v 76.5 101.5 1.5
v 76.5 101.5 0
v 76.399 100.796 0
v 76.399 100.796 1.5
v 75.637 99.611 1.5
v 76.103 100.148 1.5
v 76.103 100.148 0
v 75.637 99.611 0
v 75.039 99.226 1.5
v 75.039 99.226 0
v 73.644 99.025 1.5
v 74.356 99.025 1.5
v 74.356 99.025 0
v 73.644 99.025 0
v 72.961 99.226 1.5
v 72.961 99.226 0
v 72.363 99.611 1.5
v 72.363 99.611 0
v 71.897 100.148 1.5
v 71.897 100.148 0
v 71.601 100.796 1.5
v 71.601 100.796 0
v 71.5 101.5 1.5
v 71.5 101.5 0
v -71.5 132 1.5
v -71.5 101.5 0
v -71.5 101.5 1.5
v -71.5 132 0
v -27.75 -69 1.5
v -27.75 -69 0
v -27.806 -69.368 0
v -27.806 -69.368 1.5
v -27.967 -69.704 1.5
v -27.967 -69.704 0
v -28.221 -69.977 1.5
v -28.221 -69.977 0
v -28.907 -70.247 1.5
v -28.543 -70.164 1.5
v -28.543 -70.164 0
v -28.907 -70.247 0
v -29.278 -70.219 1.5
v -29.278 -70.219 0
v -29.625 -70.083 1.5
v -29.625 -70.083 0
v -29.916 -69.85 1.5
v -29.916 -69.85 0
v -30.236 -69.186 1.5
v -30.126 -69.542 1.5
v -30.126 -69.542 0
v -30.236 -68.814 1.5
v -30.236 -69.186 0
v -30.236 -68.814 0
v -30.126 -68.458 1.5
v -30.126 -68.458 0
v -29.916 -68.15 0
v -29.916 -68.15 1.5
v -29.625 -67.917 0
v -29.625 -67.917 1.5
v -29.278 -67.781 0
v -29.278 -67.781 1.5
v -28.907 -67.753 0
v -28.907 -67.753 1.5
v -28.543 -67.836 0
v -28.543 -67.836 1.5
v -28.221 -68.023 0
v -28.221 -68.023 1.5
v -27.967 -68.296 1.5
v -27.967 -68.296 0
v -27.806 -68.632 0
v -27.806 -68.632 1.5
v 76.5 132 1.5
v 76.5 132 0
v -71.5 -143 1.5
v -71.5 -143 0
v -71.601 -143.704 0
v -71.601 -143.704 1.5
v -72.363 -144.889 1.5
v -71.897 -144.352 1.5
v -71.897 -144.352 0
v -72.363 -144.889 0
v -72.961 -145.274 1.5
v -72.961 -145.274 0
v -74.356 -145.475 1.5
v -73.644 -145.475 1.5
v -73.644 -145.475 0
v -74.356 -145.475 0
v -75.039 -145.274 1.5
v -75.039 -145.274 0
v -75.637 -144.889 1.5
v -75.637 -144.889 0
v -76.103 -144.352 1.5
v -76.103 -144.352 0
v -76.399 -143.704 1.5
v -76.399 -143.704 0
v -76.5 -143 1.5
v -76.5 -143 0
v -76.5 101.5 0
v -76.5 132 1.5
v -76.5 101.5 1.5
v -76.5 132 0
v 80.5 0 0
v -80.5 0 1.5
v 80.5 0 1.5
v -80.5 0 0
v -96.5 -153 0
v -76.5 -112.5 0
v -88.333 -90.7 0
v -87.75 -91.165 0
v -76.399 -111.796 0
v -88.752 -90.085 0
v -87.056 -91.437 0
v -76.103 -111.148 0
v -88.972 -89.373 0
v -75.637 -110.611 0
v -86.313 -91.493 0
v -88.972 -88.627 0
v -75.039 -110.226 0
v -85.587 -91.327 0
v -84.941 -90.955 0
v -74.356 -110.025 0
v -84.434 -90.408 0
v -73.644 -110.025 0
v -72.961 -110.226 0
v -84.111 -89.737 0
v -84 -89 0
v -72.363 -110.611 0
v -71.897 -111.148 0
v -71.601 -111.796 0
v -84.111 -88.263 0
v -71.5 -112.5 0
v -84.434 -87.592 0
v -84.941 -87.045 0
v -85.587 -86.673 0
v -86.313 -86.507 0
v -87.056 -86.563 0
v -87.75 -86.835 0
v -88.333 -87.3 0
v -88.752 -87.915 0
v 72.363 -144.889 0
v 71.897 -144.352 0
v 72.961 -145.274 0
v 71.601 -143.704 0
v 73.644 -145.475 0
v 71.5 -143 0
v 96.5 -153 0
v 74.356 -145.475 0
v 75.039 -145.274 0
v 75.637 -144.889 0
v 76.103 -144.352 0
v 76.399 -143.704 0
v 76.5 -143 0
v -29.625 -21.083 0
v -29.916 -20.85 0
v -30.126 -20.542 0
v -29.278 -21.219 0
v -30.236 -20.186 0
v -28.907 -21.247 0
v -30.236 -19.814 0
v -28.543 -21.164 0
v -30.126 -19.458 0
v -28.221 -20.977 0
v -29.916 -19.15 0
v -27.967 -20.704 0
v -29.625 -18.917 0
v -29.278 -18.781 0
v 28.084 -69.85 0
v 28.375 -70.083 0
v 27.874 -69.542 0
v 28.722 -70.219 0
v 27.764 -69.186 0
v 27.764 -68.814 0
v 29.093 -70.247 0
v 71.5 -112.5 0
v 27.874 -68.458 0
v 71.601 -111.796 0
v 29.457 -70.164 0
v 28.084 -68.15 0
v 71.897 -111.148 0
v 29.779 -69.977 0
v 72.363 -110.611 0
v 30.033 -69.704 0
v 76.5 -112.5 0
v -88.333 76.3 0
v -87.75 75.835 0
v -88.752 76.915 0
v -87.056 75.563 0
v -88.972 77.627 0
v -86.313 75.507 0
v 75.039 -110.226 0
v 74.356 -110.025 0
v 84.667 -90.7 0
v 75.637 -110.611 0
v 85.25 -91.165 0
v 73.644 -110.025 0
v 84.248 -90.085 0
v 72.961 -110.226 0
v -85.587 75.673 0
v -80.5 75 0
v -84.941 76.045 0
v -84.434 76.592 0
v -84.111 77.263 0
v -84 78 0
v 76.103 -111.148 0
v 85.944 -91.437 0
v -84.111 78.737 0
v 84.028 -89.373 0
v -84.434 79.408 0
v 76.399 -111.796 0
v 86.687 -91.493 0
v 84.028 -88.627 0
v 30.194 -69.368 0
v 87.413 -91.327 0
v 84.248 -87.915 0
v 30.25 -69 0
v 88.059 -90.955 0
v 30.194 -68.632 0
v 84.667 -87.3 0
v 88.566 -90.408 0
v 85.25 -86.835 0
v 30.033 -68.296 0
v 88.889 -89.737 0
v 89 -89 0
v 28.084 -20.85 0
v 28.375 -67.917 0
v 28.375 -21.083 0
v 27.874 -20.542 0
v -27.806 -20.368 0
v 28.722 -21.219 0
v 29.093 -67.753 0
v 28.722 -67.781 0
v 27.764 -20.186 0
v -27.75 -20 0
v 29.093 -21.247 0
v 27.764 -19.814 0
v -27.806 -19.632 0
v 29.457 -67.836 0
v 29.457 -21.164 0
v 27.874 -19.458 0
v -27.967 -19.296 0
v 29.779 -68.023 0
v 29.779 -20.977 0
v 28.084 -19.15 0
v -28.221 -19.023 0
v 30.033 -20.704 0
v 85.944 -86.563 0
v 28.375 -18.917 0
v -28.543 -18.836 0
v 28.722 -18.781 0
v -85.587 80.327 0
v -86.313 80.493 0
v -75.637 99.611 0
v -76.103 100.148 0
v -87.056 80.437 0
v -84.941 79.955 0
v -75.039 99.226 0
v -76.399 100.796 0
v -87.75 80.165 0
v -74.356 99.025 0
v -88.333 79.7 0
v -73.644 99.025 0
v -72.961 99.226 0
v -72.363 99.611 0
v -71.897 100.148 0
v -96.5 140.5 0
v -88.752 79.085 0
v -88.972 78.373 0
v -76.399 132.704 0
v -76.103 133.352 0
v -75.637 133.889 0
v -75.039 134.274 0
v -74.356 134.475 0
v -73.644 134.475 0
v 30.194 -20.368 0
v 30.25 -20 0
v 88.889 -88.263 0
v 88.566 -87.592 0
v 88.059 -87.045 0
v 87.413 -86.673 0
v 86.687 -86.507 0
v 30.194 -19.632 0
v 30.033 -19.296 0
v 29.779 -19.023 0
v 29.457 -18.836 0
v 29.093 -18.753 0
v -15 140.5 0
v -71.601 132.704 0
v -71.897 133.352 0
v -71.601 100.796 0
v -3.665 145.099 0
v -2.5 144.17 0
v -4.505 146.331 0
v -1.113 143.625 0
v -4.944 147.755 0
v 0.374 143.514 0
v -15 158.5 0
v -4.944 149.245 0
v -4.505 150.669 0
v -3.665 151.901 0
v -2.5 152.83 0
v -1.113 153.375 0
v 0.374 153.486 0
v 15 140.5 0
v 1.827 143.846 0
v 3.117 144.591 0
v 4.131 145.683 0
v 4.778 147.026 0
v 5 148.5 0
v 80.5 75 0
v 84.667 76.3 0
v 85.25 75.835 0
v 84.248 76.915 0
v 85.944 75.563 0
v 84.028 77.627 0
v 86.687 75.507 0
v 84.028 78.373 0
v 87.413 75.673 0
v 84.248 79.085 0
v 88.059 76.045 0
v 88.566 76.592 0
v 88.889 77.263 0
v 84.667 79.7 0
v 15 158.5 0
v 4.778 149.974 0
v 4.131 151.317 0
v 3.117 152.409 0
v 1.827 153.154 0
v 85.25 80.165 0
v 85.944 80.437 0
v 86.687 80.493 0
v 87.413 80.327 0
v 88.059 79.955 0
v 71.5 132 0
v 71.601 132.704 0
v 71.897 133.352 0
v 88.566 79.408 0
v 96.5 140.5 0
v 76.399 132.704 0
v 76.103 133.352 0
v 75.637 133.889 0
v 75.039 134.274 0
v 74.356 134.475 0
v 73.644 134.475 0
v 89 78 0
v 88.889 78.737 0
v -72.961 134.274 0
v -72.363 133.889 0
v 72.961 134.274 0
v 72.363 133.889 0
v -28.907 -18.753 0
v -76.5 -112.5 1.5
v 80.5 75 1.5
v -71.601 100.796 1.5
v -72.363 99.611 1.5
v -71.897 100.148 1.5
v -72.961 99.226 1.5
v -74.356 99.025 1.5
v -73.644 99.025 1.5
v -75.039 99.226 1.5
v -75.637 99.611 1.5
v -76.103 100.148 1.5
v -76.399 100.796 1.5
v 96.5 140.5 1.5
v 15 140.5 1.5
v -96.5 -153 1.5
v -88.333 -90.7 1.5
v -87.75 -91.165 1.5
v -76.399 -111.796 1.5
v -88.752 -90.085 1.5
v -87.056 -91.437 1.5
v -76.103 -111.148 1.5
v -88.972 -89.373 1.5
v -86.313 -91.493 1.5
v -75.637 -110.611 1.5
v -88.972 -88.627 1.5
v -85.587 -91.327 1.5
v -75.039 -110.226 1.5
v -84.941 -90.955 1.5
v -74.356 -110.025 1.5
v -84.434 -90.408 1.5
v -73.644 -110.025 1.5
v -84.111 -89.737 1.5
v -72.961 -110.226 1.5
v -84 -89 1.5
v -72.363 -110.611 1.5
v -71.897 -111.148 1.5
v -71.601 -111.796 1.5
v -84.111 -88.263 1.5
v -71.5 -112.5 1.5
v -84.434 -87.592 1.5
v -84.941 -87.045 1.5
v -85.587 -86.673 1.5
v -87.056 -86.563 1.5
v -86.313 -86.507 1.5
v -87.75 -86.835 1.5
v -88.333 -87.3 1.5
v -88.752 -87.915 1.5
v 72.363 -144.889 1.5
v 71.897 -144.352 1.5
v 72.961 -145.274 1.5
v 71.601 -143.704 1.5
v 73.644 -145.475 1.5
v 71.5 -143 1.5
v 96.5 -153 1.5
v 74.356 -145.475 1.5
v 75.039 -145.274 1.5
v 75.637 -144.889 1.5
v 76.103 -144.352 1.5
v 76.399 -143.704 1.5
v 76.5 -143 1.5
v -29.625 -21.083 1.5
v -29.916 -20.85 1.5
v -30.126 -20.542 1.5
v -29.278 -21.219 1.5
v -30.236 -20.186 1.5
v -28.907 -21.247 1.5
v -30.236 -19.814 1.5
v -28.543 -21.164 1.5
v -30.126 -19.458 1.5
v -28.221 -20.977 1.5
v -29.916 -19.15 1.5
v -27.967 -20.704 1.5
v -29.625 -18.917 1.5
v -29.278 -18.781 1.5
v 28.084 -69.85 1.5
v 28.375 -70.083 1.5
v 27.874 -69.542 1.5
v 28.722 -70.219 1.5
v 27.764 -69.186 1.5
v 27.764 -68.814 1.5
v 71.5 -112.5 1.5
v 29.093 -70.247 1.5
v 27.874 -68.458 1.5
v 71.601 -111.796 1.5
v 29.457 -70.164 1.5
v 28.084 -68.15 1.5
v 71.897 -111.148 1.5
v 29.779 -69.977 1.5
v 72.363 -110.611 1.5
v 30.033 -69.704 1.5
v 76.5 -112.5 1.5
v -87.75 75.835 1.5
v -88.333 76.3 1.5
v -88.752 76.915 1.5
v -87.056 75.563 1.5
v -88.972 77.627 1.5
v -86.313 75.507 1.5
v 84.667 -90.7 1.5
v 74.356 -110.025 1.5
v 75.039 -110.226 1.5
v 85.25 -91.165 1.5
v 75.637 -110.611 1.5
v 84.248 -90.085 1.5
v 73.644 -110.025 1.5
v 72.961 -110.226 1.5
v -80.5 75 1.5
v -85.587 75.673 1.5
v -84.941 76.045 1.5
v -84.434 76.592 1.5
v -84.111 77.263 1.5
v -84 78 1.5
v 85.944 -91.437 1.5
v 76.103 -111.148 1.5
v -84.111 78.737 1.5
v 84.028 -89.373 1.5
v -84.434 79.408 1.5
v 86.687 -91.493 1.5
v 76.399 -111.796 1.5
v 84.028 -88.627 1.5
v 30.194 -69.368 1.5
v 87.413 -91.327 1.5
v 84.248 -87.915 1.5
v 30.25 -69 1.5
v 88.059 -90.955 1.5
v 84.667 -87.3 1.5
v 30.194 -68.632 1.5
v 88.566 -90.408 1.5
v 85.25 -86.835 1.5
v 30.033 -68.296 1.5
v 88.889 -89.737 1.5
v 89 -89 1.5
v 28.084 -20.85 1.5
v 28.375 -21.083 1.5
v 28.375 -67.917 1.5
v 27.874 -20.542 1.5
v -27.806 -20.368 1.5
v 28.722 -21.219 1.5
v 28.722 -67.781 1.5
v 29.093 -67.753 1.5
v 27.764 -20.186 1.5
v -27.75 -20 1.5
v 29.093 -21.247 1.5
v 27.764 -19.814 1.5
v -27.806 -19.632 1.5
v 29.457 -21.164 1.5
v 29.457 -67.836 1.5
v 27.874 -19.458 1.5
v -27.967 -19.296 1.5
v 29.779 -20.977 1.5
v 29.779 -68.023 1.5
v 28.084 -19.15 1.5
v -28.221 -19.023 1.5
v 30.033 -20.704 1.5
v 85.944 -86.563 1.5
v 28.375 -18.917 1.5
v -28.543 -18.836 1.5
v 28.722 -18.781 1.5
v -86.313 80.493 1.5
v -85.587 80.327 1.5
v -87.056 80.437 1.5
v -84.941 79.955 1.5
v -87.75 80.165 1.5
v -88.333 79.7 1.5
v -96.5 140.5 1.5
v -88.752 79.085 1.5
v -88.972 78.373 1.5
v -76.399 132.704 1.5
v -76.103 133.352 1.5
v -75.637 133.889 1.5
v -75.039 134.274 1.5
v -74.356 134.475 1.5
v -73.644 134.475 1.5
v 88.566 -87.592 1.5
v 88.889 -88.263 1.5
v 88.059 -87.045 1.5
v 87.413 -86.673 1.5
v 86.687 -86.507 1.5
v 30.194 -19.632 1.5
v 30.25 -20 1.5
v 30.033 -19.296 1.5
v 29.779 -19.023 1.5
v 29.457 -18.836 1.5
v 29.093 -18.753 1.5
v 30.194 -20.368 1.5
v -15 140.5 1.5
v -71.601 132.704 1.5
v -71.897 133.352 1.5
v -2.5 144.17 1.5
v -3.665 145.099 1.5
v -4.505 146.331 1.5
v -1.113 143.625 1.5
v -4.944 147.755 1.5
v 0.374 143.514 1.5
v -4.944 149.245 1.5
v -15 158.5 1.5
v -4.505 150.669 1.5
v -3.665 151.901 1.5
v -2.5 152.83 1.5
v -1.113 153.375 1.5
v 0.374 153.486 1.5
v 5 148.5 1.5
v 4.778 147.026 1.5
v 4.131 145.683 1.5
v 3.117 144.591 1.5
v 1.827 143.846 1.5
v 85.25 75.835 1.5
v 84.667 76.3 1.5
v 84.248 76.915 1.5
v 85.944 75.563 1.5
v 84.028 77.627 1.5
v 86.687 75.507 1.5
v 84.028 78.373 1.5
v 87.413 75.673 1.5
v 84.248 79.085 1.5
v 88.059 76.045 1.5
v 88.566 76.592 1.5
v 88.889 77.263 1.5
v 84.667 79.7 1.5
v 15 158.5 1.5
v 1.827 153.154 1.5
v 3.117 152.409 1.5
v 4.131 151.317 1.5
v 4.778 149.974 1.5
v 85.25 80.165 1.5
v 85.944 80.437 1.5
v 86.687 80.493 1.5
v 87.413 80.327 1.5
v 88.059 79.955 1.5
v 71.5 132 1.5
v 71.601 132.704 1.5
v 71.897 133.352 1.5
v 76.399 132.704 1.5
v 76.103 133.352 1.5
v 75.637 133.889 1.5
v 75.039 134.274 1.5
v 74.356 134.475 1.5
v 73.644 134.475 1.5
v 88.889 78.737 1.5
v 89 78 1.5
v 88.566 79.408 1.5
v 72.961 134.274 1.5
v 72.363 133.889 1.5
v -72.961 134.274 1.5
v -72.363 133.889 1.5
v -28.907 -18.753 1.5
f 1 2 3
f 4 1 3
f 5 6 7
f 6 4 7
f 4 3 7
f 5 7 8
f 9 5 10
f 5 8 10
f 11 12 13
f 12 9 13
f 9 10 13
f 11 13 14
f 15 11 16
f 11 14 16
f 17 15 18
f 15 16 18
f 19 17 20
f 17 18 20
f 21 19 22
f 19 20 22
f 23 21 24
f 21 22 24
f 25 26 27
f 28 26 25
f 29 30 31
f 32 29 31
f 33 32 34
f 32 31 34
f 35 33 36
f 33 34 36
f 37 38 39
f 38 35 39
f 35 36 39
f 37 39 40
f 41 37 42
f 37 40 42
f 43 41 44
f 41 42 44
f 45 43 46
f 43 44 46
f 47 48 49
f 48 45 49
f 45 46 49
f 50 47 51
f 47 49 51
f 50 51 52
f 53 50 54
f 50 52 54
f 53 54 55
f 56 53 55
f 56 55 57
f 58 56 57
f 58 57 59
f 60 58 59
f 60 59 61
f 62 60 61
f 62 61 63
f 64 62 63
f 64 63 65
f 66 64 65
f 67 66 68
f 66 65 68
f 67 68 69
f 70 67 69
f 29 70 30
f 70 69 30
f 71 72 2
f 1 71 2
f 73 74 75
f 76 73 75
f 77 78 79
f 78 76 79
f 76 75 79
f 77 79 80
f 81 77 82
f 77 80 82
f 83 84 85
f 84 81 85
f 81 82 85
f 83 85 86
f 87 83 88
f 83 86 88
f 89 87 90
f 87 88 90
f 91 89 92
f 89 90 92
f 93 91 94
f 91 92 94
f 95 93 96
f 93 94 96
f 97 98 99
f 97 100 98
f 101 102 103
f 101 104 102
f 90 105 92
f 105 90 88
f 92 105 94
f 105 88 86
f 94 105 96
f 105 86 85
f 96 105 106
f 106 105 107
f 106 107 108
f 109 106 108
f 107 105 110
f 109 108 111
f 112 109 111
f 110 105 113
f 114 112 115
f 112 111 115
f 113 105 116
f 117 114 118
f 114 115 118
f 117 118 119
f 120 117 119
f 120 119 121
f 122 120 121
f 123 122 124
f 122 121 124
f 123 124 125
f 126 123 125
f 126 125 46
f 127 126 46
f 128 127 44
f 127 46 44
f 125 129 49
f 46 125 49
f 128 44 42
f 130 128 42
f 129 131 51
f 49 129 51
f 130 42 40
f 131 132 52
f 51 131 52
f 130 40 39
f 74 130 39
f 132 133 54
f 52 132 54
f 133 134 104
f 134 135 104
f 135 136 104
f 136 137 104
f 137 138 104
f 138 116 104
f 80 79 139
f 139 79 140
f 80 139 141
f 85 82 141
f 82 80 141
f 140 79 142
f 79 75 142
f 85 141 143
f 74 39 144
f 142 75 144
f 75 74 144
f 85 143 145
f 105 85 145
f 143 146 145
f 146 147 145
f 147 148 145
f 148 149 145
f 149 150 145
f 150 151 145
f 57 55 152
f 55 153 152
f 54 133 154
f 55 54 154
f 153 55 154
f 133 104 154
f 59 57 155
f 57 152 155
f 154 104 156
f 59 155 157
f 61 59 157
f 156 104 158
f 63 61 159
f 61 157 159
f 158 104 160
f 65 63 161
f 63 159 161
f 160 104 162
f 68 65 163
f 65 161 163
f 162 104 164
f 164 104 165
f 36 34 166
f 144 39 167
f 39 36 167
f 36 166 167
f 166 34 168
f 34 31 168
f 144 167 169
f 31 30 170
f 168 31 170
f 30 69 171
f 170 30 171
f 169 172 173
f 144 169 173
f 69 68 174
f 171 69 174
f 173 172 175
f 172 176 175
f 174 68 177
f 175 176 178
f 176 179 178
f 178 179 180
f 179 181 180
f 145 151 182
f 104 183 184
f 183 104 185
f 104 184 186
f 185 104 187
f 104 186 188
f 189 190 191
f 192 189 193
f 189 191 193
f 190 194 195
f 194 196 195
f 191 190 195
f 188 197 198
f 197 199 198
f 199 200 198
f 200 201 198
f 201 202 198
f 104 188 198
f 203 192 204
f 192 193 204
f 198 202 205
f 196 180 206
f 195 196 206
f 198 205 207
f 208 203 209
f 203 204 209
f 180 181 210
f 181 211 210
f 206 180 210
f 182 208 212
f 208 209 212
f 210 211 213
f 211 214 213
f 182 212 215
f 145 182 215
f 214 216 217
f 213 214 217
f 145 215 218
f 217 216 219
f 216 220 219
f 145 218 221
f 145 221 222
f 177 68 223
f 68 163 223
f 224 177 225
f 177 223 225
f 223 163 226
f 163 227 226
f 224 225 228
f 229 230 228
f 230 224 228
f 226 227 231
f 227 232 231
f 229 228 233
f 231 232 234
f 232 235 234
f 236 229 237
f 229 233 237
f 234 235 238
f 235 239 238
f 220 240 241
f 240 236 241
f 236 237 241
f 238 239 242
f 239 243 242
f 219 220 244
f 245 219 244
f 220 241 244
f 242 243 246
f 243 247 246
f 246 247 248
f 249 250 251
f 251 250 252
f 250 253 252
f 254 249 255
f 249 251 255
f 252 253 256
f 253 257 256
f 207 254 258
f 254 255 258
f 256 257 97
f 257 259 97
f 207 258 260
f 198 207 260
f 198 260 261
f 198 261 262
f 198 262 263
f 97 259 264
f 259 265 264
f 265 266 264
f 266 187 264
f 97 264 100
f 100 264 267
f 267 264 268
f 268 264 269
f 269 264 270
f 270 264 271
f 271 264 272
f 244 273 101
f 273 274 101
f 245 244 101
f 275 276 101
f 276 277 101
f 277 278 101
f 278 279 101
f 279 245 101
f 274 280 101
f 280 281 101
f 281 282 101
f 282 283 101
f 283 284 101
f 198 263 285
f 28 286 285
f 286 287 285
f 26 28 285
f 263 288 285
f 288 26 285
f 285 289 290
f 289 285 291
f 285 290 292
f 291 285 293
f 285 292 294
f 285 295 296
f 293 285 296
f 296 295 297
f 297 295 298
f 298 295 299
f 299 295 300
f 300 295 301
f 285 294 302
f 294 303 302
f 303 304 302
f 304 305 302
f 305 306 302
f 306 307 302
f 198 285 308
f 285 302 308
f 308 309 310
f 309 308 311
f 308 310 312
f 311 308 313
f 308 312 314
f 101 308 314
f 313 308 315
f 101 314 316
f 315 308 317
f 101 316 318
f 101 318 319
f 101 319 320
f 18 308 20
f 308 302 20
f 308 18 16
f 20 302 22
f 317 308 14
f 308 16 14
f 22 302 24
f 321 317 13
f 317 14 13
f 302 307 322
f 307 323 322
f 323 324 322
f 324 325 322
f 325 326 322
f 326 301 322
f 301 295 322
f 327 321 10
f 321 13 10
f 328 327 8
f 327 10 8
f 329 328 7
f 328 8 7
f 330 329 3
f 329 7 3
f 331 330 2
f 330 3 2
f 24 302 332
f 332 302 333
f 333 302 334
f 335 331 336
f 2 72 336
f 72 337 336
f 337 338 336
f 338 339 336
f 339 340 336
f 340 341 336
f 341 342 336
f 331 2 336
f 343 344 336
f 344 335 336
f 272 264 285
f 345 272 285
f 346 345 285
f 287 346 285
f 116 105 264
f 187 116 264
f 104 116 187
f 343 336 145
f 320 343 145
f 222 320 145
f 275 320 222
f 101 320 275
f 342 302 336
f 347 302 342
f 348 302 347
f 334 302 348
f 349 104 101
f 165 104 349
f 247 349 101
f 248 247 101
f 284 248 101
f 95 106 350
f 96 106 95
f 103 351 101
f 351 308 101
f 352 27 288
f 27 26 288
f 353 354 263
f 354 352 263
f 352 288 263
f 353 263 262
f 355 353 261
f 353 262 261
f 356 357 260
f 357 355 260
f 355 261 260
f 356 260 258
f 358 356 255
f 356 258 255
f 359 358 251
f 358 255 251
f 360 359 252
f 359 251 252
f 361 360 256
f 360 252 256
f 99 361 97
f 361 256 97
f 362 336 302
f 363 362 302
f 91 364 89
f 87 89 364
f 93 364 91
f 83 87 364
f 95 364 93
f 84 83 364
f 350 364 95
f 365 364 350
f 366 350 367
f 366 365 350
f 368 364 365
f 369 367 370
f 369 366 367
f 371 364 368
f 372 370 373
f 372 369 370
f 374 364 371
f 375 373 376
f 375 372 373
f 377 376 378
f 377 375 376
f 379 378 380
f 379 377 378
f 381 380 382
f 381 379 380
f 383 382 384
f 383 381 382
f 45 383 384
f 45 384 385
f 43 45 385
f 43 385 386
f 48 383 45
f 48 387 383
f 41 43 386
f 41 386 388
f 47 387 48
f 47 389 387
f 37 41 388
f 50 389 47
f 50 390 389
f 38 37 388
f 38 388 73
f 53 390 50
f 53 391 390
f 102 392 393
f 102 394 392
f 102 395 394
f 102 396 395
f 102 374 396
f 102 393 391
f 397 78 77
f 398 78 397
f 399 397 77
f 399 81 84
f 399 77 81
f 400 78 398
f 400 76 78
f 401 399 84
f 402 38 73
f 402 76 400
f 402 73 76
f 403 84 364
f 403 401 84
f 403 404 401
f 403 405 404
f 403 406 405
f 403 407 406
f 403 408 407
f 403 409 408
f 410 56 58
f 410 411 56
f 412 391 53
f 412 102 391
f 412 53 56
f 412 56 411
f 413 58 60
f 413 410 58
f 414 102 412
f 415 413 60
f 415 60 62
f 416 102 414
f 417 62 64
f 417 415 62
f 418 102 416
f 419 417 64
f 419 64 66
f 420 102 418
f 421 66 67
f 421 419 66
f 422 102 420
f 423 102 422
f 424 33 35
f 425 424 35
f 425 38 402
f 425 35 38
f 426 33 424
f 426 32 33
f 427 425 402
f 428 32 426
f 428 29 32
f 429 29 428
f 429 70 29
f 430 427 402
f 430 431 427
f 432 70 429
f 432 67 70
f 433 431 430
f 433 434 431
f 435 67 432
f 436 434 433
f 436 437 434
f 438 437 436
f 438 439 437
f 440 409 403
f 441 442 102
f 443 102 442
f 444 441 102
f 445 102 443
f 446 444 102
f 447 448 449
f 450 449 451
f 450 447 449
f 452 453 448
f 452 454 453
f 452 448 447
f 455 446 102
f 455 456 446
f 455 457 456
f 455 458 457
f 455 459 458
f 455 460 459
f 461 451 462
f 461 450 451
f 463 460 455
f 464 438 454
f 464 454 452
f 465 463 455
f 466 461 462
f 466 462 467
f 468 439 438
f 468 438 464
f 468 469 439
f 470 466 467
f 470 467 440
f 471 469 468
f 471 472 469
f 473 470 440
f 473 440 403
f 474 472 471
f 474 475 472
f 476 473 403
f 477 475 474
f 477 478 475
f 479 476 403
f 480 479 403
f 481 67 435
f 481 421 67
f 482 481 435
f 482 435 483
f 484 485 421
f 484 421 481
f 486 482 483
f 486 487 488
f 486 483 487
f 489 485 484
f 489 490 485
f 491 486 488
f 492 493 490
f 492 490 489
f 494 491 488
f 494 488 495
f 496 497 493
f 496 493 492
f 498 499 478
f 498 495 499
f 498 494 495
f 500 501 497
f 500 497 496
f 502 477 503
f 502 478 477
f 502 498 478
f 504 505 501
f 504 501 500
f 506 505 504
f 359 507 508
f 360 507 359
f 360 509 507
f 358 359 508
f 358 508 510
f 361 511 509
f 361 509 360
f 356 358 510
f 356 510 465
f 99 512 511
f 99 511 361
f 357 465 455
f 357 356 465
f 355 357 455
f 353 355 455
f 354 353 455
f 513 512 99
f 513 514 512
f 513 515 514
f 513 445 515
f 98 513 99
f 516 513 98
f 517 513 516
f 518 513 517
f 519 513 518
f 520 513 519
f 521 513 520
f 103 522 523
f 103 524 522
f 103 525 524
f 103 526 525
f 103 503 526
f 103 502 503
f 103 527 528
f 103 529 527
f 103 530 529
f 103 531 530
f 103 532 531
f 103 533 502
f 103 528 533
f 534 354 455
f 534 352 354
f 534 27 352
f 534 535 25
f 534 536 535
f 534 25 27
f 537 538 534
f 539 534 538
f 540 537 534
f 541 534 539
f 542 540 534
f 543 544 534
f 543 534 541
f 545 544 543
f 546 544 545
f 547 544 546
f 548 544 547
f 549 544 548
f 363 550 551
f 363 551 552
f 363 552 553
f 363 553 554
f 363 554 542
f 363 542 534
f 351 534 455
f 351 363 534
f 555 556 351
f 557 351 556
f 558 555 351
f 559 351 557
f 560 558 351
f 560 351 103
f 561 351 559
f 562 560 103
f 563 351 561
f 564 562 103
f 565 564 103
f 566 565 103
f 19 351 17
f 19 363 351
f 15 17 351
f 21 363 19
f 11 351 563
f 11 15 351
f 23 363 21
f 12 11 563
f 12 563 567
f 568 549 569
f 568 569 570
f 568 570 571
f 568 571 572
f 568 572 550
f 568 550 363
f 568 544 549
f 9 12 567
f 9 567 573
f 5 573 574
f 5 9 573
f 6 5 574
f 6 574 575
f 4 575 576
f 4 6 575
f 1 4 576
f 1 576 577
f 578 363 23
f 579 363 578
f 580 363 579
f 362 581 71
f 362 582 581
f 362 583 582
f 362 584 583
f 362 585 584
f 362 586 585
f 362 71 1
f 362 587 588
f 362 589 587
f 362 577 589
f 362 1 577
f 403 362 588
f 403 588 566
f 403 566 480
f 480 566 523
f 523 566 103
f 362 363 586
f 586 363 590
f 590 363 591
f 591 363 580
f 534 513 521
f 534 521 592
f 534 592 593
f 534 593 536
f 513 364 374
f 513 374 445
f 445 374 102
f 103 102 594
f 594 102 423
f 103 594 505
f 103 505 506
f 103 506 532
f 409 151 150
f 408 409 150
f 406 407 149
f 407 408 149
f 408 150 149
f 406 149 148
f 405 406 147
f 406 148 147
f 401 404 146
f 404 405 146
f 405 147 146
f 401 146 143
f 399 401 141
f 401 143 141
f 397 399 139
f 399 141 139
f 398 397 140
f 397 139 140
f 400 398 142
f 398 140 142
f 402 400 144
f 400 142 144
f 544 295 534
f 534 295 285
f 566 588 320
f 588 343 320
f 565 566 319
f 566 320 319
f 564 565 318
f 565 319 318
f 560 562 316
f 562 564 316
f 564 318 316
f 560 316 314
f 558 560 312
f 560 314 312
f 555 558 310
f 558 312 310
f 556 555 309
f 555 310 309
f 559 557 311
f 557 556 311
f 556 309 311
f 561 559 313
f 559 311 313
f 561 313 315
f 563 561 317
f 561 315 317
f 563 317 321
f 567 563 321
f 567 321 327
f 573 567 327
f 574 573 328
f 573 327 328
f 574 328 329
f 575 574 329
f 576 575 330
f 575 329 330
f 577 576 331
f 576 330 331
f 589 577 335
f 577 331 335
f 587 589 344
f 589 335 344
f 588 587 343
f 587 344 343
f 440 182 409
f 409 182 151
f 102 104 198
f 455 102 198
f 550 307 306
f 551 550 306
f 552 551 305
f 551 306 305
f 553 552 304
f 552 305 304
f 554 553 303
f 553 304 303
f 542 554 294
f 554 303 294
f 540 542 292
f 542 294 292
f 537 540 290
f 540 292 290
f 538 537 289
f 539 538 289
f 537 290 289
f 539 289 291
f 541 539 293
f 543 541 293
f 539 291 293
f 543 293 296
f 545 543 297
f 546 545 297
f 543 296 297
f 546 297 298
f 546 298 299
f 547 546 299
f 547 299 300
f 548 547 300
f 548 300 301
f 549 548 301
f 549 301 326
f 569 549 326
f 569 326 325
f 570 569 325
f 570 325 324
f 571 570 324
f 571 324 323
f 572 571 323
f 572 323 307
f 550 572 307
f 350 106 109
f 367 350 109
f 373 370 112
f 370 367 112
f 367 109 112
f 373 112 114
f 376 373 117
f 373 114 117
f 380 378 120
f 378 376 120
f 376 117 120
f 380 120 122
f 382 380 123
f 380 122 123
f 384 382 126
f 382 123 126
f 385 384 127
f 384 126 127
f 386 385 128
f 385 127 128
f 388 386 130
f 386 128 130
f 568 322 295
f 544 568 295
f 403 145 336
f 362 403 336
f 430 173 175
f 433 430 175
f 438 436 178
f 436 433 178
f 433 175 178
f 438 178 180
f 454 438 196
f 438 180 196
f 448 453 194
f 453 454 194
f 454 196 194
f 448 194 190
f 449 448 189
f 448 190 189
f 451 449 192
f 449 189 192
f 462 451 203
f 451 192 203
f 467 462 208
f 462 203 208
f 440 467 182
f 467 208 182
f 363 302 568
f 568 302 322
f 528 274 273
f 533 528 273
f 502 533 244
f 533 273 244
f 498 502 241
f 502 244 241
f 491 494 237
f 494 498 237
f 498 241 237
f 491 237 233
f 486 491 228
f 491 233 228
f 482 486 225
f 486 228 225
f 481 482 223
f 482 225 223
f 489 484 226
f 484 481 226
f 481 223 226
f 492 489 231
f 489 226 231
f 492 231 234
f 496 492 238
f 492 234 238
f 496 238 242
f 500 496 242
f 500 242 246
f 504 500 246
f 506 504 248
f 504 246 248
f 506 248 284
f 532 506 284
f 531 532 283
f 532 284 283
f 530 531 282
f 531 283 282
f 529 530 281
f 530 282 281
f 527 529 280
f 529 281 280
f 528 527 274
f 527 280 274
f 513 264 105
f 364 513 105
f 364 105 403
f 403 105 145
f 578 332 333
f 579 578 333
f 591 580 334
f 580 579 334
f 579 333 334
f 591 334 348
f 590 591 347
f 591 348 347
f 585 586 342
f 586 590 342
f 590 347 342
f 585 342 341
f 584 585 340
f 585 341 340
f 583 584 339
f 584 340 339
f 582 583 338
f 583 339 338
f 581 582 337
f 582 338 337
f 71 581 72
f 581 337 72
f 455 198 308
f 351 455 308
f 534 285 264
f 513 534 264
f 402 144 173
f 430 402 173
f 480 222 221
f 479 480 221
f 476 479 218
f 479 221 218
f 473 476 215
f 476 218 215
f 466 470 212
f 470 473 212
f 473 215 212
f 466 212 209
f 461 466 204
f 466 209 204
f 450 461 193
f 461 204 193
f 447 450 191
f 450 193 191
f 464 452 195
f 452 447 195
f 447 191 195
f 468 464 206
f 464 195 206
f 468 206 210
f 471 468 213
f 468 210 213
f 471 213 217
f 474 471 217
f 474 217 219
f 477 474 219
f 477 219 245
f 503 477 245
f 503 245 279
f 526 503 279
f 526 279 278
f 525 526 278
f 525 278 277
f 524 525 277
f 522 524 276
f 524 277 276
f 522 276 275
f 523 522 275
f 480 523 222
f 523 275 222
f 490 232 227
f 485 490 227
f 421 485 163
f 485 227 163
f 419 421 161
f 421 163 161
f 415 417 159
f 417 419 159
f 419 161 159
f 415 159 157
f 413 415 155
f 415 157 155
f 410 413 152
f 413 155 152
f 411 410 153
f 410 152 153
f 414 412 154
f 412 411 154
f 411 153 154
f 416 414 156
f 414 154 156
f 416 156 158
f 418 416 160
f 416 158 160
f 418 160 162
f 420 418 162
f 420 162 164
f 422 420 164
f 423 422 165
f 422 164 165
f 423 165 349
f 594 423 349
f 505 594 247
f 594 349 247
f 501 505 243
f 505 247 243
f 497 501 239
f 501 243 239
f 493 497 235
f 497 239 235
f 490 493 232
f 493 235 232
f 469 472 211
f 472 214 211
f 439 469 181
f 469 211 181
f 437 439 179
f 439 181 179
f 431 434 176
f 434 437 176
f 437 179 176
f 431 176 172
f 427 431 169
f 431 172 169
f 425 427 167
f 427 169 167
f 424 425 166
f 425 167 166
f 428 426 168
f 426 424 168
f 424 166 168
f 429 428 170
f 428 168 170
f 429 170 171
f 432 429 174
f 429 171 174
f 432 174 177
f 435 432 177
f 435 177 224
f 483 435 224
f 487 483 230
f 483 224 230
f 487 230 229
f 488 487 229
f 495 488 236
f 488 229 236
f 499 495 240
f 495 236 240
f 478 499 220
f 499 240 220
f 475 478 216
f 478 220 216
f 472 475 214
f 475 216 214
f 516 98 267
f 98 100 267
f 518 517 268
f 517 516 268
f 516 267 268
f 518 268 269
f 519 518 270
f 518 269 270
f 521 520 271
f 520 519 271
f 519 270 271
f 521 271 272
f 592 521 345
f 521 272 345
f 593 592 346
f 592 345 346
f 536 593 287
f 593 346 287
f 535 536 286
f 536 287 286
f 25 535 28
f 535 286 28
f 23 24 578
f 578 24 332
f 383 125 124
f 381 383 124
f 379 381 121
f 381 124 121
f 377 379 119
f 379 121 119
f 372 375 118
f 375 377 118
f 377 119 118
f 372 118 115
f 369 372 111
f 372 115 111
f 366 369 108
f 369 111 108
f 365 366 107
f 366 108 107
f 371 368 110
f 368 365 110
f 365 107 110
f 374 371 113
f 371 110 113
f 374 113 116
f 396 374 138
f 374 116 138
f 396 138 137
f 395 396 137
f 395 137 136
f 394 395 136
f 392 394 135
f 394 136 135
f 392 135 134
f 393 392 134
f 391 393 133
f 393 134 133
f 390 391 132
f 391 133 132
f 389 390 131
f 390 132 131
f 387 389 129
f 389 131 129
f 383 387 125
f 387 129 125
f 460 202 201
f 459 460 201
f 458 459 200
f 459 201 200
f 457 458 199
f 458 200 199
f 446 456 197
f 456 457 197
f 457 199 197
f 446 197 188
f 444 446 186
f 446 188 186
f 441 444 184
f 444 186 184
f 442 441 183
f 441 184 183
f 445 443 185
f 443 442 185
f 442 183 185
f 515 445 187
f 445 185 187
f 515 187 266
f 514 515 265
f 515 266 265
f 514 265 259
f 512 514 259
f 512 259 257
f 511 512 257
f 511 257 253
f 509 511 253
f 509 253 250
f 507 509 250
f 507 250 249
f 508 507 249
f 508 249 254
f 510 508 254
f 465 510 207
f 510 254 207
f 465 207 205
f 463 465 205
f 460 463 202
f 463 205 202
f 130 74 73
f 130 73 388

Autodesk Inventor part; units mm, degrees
ref_plane "YZ Plane" through (0, 0, 0) normal (1, 0, 0) x (0, 1, 0)
ref_plane "XZ Plane" through (0, 0, 0) normal (0, 1, 0) x (-1, 0, 0)
ref_plane "XY Plane" through (0, 0, 0) normal (0, 0, 1) x (1, 0, 0)
sketch "Skizze1" plane through (0, 0, 0) normal (0, 0, 1) x (1, 0, 0)
  line L0 (-135.1, 0) -> (135.1, 0) projected
  line L1 (0, -215.3) -> (0, 220.8) projected
  line L2 (15, 140.5) -> (15, 158.5)
  line L3 (15, 158.5) -> (-15, 158.5)
  line L4 (-15, 158.5) -> (-15, 140.5)
  line L5 (-15, 140.5) -> (-96.5, 140.5)
  line L6 (-96.5, 140.5) -> (-96.5, -153)
  line L7 (-96.5, -153) -> (96.5, -153)
  line L8 (96.5, -153) -> (96.5, 140.5)
  line L9 (96.5, 140.5) -> (15, 140.5)
  circle A0 centre (86.5, 78) radius 2.5
  circle A1 centre (-86.5, 78) radius 2.5
  circle A2 centre (-86.5, -89) radius 2.5
  circle A3 centre (86.5, -89) radius 2.5
  arc A4 (-71.5, 132) -> (-76.5, 132) centre (-74, 132) ccw
  line L10 (-76.5, 132) -> (-76.5, 101.5)
  arc A5 (-76.5, 101.5) -> (-71.5, 101.5) centre (-74, 101.5) ccw
  line L11 (-71.5, 101.5) -> (-71.5, 132)
  arc A6 (76.5, 132) -> (71.5, 132) centre (74, 132) ccw
  line L12 (76.5, 132) -> (76.5, 101.5)
  arc A7 (71.5, 101.5) -> (76.5, 101.5) centre (74, 101.5) ccw
  line L13 (71.5, 101.5) -> (71.5, 132)
  line L14 (-80.5, 75) -> (80.5, 75)
  line L15 (80.5, 75) -> (80.5, 0)
  line L16 (80.5, 0) -> (-80.5, 0)
  line L17 (-80.5, 0) -> (-80.5, 75)
  circle A8 centre (29, -20) radius 1.25
  circle A9 centre (-29, -20) radius 1.25
  circle A10 centre (-29, -69) radius 1.25
  circle A11 centre (29, -69) radius 1.25
  arc A12 (-71.5, -112.5) -> (-76.5, -112.5) centre (-74, -112.5) ccw
  line L18 (-76.5, -112.5) -> (-76.5, -143)
  arc A13 (-76.5, -143) -> (-71.5, -143) centre (-74, -143) ccw
  line L19 (-71.5, -143) -> (-71.5, -112.5)
  arc A14 (76.5, -112.5) -> (71.5, -112.5) centre (74, -112.5) ccw
  line L20 (76.5, -112.5) -> (76.5, -143)
  arc A15 (71.5, -143) -> (76.5, -143) centre (74, -143) ccw
  line L21 (71.5, -143) -> (71.5, -112.5)
  circle A16 centre (0, 148.5) radius 5
  point P0 (0, 0)
  dimension "d0" = 30
  dimension "d1" = 193
  dimension "d2" = 293.5
  dimension "d3" = 65.5
  dimension "d4" = 75
  dimension "d5" = 16
  dimension "d6" = 16
  dimension "d7" = 65.5
  dimension "d9" = 148
  dimension "d10" = 5
  dimension "d11" = 2.5
  dimension "d12" = 2.5
  dimension "d13" = 30.5
  dimension "d14" = 8.5
  dimension "d15" = 5
  dimension "d16" = 30.5
  dimension "d17" = 2.5
  dimension "d18" = 2.5
  dimension "d19" = 143
  dimension "d20" = 6
  dimension "d21" = 3
  dimension "d22" = 6
  dimension "d23" = 3
  dimension "d24" = 75
  dimension "d25" = 167
  dimension "d26" = 10
  dimension "d27" = 167
  dimension "d28" = 10
  dimension "d29" = 20
  dimension "d30" = 8.5
  dimension "d31" = 81.5
  dimension "d32" = 58
  dimension "d33" = 49
  dimension "d34" = 58
  dimension "d35" = 49
  dimension "d36" = 67.5
  dimension "d37" = 67.5
  dimension "d38" = 67.5
  dimension "d39" = 20
  dimension "d40" = 84
  dimension "d41" = 5
  dimension "d42" = 5
  dimension "d43" = 2.5
  dimension "d44" = 2.5
  dimension "d45" = 2.5
  dimension "d46" = 2.5
  dimension "d47" = 5
  dimension "d48" = 5
  dimension "d49" = 2.5
  dimension "d50" = 2.5
  dimension "d51" = 2.5
  dimension "d52" = 2.5
  dimension "d53" = 30.5
  dimension "d54" = 30.5
  dimension "d55" = 5
  dimension "d56" = 5
  dimension "d57" = 10
  dimension "d58" = 10
  dimension "d59" = 22.5
  dimension "d60" = 22.5
  dimension "d61" = 22.5
  dimension "d62" = 22.5
  dimension "d63" = 143
  dimension "d65" = 18
extrude "Extrusion1" add sketch "Skizze1" along normal blind 1.5 contours L6 L5 L4 L3 L1 A16 L14 L17 L0 | L0 L1 L7 L6 | L0 L8 L7 L1 | L15 L14 L1 A16 L3 L2 L9 L8 L0
properties part number "Innengehäuse"
